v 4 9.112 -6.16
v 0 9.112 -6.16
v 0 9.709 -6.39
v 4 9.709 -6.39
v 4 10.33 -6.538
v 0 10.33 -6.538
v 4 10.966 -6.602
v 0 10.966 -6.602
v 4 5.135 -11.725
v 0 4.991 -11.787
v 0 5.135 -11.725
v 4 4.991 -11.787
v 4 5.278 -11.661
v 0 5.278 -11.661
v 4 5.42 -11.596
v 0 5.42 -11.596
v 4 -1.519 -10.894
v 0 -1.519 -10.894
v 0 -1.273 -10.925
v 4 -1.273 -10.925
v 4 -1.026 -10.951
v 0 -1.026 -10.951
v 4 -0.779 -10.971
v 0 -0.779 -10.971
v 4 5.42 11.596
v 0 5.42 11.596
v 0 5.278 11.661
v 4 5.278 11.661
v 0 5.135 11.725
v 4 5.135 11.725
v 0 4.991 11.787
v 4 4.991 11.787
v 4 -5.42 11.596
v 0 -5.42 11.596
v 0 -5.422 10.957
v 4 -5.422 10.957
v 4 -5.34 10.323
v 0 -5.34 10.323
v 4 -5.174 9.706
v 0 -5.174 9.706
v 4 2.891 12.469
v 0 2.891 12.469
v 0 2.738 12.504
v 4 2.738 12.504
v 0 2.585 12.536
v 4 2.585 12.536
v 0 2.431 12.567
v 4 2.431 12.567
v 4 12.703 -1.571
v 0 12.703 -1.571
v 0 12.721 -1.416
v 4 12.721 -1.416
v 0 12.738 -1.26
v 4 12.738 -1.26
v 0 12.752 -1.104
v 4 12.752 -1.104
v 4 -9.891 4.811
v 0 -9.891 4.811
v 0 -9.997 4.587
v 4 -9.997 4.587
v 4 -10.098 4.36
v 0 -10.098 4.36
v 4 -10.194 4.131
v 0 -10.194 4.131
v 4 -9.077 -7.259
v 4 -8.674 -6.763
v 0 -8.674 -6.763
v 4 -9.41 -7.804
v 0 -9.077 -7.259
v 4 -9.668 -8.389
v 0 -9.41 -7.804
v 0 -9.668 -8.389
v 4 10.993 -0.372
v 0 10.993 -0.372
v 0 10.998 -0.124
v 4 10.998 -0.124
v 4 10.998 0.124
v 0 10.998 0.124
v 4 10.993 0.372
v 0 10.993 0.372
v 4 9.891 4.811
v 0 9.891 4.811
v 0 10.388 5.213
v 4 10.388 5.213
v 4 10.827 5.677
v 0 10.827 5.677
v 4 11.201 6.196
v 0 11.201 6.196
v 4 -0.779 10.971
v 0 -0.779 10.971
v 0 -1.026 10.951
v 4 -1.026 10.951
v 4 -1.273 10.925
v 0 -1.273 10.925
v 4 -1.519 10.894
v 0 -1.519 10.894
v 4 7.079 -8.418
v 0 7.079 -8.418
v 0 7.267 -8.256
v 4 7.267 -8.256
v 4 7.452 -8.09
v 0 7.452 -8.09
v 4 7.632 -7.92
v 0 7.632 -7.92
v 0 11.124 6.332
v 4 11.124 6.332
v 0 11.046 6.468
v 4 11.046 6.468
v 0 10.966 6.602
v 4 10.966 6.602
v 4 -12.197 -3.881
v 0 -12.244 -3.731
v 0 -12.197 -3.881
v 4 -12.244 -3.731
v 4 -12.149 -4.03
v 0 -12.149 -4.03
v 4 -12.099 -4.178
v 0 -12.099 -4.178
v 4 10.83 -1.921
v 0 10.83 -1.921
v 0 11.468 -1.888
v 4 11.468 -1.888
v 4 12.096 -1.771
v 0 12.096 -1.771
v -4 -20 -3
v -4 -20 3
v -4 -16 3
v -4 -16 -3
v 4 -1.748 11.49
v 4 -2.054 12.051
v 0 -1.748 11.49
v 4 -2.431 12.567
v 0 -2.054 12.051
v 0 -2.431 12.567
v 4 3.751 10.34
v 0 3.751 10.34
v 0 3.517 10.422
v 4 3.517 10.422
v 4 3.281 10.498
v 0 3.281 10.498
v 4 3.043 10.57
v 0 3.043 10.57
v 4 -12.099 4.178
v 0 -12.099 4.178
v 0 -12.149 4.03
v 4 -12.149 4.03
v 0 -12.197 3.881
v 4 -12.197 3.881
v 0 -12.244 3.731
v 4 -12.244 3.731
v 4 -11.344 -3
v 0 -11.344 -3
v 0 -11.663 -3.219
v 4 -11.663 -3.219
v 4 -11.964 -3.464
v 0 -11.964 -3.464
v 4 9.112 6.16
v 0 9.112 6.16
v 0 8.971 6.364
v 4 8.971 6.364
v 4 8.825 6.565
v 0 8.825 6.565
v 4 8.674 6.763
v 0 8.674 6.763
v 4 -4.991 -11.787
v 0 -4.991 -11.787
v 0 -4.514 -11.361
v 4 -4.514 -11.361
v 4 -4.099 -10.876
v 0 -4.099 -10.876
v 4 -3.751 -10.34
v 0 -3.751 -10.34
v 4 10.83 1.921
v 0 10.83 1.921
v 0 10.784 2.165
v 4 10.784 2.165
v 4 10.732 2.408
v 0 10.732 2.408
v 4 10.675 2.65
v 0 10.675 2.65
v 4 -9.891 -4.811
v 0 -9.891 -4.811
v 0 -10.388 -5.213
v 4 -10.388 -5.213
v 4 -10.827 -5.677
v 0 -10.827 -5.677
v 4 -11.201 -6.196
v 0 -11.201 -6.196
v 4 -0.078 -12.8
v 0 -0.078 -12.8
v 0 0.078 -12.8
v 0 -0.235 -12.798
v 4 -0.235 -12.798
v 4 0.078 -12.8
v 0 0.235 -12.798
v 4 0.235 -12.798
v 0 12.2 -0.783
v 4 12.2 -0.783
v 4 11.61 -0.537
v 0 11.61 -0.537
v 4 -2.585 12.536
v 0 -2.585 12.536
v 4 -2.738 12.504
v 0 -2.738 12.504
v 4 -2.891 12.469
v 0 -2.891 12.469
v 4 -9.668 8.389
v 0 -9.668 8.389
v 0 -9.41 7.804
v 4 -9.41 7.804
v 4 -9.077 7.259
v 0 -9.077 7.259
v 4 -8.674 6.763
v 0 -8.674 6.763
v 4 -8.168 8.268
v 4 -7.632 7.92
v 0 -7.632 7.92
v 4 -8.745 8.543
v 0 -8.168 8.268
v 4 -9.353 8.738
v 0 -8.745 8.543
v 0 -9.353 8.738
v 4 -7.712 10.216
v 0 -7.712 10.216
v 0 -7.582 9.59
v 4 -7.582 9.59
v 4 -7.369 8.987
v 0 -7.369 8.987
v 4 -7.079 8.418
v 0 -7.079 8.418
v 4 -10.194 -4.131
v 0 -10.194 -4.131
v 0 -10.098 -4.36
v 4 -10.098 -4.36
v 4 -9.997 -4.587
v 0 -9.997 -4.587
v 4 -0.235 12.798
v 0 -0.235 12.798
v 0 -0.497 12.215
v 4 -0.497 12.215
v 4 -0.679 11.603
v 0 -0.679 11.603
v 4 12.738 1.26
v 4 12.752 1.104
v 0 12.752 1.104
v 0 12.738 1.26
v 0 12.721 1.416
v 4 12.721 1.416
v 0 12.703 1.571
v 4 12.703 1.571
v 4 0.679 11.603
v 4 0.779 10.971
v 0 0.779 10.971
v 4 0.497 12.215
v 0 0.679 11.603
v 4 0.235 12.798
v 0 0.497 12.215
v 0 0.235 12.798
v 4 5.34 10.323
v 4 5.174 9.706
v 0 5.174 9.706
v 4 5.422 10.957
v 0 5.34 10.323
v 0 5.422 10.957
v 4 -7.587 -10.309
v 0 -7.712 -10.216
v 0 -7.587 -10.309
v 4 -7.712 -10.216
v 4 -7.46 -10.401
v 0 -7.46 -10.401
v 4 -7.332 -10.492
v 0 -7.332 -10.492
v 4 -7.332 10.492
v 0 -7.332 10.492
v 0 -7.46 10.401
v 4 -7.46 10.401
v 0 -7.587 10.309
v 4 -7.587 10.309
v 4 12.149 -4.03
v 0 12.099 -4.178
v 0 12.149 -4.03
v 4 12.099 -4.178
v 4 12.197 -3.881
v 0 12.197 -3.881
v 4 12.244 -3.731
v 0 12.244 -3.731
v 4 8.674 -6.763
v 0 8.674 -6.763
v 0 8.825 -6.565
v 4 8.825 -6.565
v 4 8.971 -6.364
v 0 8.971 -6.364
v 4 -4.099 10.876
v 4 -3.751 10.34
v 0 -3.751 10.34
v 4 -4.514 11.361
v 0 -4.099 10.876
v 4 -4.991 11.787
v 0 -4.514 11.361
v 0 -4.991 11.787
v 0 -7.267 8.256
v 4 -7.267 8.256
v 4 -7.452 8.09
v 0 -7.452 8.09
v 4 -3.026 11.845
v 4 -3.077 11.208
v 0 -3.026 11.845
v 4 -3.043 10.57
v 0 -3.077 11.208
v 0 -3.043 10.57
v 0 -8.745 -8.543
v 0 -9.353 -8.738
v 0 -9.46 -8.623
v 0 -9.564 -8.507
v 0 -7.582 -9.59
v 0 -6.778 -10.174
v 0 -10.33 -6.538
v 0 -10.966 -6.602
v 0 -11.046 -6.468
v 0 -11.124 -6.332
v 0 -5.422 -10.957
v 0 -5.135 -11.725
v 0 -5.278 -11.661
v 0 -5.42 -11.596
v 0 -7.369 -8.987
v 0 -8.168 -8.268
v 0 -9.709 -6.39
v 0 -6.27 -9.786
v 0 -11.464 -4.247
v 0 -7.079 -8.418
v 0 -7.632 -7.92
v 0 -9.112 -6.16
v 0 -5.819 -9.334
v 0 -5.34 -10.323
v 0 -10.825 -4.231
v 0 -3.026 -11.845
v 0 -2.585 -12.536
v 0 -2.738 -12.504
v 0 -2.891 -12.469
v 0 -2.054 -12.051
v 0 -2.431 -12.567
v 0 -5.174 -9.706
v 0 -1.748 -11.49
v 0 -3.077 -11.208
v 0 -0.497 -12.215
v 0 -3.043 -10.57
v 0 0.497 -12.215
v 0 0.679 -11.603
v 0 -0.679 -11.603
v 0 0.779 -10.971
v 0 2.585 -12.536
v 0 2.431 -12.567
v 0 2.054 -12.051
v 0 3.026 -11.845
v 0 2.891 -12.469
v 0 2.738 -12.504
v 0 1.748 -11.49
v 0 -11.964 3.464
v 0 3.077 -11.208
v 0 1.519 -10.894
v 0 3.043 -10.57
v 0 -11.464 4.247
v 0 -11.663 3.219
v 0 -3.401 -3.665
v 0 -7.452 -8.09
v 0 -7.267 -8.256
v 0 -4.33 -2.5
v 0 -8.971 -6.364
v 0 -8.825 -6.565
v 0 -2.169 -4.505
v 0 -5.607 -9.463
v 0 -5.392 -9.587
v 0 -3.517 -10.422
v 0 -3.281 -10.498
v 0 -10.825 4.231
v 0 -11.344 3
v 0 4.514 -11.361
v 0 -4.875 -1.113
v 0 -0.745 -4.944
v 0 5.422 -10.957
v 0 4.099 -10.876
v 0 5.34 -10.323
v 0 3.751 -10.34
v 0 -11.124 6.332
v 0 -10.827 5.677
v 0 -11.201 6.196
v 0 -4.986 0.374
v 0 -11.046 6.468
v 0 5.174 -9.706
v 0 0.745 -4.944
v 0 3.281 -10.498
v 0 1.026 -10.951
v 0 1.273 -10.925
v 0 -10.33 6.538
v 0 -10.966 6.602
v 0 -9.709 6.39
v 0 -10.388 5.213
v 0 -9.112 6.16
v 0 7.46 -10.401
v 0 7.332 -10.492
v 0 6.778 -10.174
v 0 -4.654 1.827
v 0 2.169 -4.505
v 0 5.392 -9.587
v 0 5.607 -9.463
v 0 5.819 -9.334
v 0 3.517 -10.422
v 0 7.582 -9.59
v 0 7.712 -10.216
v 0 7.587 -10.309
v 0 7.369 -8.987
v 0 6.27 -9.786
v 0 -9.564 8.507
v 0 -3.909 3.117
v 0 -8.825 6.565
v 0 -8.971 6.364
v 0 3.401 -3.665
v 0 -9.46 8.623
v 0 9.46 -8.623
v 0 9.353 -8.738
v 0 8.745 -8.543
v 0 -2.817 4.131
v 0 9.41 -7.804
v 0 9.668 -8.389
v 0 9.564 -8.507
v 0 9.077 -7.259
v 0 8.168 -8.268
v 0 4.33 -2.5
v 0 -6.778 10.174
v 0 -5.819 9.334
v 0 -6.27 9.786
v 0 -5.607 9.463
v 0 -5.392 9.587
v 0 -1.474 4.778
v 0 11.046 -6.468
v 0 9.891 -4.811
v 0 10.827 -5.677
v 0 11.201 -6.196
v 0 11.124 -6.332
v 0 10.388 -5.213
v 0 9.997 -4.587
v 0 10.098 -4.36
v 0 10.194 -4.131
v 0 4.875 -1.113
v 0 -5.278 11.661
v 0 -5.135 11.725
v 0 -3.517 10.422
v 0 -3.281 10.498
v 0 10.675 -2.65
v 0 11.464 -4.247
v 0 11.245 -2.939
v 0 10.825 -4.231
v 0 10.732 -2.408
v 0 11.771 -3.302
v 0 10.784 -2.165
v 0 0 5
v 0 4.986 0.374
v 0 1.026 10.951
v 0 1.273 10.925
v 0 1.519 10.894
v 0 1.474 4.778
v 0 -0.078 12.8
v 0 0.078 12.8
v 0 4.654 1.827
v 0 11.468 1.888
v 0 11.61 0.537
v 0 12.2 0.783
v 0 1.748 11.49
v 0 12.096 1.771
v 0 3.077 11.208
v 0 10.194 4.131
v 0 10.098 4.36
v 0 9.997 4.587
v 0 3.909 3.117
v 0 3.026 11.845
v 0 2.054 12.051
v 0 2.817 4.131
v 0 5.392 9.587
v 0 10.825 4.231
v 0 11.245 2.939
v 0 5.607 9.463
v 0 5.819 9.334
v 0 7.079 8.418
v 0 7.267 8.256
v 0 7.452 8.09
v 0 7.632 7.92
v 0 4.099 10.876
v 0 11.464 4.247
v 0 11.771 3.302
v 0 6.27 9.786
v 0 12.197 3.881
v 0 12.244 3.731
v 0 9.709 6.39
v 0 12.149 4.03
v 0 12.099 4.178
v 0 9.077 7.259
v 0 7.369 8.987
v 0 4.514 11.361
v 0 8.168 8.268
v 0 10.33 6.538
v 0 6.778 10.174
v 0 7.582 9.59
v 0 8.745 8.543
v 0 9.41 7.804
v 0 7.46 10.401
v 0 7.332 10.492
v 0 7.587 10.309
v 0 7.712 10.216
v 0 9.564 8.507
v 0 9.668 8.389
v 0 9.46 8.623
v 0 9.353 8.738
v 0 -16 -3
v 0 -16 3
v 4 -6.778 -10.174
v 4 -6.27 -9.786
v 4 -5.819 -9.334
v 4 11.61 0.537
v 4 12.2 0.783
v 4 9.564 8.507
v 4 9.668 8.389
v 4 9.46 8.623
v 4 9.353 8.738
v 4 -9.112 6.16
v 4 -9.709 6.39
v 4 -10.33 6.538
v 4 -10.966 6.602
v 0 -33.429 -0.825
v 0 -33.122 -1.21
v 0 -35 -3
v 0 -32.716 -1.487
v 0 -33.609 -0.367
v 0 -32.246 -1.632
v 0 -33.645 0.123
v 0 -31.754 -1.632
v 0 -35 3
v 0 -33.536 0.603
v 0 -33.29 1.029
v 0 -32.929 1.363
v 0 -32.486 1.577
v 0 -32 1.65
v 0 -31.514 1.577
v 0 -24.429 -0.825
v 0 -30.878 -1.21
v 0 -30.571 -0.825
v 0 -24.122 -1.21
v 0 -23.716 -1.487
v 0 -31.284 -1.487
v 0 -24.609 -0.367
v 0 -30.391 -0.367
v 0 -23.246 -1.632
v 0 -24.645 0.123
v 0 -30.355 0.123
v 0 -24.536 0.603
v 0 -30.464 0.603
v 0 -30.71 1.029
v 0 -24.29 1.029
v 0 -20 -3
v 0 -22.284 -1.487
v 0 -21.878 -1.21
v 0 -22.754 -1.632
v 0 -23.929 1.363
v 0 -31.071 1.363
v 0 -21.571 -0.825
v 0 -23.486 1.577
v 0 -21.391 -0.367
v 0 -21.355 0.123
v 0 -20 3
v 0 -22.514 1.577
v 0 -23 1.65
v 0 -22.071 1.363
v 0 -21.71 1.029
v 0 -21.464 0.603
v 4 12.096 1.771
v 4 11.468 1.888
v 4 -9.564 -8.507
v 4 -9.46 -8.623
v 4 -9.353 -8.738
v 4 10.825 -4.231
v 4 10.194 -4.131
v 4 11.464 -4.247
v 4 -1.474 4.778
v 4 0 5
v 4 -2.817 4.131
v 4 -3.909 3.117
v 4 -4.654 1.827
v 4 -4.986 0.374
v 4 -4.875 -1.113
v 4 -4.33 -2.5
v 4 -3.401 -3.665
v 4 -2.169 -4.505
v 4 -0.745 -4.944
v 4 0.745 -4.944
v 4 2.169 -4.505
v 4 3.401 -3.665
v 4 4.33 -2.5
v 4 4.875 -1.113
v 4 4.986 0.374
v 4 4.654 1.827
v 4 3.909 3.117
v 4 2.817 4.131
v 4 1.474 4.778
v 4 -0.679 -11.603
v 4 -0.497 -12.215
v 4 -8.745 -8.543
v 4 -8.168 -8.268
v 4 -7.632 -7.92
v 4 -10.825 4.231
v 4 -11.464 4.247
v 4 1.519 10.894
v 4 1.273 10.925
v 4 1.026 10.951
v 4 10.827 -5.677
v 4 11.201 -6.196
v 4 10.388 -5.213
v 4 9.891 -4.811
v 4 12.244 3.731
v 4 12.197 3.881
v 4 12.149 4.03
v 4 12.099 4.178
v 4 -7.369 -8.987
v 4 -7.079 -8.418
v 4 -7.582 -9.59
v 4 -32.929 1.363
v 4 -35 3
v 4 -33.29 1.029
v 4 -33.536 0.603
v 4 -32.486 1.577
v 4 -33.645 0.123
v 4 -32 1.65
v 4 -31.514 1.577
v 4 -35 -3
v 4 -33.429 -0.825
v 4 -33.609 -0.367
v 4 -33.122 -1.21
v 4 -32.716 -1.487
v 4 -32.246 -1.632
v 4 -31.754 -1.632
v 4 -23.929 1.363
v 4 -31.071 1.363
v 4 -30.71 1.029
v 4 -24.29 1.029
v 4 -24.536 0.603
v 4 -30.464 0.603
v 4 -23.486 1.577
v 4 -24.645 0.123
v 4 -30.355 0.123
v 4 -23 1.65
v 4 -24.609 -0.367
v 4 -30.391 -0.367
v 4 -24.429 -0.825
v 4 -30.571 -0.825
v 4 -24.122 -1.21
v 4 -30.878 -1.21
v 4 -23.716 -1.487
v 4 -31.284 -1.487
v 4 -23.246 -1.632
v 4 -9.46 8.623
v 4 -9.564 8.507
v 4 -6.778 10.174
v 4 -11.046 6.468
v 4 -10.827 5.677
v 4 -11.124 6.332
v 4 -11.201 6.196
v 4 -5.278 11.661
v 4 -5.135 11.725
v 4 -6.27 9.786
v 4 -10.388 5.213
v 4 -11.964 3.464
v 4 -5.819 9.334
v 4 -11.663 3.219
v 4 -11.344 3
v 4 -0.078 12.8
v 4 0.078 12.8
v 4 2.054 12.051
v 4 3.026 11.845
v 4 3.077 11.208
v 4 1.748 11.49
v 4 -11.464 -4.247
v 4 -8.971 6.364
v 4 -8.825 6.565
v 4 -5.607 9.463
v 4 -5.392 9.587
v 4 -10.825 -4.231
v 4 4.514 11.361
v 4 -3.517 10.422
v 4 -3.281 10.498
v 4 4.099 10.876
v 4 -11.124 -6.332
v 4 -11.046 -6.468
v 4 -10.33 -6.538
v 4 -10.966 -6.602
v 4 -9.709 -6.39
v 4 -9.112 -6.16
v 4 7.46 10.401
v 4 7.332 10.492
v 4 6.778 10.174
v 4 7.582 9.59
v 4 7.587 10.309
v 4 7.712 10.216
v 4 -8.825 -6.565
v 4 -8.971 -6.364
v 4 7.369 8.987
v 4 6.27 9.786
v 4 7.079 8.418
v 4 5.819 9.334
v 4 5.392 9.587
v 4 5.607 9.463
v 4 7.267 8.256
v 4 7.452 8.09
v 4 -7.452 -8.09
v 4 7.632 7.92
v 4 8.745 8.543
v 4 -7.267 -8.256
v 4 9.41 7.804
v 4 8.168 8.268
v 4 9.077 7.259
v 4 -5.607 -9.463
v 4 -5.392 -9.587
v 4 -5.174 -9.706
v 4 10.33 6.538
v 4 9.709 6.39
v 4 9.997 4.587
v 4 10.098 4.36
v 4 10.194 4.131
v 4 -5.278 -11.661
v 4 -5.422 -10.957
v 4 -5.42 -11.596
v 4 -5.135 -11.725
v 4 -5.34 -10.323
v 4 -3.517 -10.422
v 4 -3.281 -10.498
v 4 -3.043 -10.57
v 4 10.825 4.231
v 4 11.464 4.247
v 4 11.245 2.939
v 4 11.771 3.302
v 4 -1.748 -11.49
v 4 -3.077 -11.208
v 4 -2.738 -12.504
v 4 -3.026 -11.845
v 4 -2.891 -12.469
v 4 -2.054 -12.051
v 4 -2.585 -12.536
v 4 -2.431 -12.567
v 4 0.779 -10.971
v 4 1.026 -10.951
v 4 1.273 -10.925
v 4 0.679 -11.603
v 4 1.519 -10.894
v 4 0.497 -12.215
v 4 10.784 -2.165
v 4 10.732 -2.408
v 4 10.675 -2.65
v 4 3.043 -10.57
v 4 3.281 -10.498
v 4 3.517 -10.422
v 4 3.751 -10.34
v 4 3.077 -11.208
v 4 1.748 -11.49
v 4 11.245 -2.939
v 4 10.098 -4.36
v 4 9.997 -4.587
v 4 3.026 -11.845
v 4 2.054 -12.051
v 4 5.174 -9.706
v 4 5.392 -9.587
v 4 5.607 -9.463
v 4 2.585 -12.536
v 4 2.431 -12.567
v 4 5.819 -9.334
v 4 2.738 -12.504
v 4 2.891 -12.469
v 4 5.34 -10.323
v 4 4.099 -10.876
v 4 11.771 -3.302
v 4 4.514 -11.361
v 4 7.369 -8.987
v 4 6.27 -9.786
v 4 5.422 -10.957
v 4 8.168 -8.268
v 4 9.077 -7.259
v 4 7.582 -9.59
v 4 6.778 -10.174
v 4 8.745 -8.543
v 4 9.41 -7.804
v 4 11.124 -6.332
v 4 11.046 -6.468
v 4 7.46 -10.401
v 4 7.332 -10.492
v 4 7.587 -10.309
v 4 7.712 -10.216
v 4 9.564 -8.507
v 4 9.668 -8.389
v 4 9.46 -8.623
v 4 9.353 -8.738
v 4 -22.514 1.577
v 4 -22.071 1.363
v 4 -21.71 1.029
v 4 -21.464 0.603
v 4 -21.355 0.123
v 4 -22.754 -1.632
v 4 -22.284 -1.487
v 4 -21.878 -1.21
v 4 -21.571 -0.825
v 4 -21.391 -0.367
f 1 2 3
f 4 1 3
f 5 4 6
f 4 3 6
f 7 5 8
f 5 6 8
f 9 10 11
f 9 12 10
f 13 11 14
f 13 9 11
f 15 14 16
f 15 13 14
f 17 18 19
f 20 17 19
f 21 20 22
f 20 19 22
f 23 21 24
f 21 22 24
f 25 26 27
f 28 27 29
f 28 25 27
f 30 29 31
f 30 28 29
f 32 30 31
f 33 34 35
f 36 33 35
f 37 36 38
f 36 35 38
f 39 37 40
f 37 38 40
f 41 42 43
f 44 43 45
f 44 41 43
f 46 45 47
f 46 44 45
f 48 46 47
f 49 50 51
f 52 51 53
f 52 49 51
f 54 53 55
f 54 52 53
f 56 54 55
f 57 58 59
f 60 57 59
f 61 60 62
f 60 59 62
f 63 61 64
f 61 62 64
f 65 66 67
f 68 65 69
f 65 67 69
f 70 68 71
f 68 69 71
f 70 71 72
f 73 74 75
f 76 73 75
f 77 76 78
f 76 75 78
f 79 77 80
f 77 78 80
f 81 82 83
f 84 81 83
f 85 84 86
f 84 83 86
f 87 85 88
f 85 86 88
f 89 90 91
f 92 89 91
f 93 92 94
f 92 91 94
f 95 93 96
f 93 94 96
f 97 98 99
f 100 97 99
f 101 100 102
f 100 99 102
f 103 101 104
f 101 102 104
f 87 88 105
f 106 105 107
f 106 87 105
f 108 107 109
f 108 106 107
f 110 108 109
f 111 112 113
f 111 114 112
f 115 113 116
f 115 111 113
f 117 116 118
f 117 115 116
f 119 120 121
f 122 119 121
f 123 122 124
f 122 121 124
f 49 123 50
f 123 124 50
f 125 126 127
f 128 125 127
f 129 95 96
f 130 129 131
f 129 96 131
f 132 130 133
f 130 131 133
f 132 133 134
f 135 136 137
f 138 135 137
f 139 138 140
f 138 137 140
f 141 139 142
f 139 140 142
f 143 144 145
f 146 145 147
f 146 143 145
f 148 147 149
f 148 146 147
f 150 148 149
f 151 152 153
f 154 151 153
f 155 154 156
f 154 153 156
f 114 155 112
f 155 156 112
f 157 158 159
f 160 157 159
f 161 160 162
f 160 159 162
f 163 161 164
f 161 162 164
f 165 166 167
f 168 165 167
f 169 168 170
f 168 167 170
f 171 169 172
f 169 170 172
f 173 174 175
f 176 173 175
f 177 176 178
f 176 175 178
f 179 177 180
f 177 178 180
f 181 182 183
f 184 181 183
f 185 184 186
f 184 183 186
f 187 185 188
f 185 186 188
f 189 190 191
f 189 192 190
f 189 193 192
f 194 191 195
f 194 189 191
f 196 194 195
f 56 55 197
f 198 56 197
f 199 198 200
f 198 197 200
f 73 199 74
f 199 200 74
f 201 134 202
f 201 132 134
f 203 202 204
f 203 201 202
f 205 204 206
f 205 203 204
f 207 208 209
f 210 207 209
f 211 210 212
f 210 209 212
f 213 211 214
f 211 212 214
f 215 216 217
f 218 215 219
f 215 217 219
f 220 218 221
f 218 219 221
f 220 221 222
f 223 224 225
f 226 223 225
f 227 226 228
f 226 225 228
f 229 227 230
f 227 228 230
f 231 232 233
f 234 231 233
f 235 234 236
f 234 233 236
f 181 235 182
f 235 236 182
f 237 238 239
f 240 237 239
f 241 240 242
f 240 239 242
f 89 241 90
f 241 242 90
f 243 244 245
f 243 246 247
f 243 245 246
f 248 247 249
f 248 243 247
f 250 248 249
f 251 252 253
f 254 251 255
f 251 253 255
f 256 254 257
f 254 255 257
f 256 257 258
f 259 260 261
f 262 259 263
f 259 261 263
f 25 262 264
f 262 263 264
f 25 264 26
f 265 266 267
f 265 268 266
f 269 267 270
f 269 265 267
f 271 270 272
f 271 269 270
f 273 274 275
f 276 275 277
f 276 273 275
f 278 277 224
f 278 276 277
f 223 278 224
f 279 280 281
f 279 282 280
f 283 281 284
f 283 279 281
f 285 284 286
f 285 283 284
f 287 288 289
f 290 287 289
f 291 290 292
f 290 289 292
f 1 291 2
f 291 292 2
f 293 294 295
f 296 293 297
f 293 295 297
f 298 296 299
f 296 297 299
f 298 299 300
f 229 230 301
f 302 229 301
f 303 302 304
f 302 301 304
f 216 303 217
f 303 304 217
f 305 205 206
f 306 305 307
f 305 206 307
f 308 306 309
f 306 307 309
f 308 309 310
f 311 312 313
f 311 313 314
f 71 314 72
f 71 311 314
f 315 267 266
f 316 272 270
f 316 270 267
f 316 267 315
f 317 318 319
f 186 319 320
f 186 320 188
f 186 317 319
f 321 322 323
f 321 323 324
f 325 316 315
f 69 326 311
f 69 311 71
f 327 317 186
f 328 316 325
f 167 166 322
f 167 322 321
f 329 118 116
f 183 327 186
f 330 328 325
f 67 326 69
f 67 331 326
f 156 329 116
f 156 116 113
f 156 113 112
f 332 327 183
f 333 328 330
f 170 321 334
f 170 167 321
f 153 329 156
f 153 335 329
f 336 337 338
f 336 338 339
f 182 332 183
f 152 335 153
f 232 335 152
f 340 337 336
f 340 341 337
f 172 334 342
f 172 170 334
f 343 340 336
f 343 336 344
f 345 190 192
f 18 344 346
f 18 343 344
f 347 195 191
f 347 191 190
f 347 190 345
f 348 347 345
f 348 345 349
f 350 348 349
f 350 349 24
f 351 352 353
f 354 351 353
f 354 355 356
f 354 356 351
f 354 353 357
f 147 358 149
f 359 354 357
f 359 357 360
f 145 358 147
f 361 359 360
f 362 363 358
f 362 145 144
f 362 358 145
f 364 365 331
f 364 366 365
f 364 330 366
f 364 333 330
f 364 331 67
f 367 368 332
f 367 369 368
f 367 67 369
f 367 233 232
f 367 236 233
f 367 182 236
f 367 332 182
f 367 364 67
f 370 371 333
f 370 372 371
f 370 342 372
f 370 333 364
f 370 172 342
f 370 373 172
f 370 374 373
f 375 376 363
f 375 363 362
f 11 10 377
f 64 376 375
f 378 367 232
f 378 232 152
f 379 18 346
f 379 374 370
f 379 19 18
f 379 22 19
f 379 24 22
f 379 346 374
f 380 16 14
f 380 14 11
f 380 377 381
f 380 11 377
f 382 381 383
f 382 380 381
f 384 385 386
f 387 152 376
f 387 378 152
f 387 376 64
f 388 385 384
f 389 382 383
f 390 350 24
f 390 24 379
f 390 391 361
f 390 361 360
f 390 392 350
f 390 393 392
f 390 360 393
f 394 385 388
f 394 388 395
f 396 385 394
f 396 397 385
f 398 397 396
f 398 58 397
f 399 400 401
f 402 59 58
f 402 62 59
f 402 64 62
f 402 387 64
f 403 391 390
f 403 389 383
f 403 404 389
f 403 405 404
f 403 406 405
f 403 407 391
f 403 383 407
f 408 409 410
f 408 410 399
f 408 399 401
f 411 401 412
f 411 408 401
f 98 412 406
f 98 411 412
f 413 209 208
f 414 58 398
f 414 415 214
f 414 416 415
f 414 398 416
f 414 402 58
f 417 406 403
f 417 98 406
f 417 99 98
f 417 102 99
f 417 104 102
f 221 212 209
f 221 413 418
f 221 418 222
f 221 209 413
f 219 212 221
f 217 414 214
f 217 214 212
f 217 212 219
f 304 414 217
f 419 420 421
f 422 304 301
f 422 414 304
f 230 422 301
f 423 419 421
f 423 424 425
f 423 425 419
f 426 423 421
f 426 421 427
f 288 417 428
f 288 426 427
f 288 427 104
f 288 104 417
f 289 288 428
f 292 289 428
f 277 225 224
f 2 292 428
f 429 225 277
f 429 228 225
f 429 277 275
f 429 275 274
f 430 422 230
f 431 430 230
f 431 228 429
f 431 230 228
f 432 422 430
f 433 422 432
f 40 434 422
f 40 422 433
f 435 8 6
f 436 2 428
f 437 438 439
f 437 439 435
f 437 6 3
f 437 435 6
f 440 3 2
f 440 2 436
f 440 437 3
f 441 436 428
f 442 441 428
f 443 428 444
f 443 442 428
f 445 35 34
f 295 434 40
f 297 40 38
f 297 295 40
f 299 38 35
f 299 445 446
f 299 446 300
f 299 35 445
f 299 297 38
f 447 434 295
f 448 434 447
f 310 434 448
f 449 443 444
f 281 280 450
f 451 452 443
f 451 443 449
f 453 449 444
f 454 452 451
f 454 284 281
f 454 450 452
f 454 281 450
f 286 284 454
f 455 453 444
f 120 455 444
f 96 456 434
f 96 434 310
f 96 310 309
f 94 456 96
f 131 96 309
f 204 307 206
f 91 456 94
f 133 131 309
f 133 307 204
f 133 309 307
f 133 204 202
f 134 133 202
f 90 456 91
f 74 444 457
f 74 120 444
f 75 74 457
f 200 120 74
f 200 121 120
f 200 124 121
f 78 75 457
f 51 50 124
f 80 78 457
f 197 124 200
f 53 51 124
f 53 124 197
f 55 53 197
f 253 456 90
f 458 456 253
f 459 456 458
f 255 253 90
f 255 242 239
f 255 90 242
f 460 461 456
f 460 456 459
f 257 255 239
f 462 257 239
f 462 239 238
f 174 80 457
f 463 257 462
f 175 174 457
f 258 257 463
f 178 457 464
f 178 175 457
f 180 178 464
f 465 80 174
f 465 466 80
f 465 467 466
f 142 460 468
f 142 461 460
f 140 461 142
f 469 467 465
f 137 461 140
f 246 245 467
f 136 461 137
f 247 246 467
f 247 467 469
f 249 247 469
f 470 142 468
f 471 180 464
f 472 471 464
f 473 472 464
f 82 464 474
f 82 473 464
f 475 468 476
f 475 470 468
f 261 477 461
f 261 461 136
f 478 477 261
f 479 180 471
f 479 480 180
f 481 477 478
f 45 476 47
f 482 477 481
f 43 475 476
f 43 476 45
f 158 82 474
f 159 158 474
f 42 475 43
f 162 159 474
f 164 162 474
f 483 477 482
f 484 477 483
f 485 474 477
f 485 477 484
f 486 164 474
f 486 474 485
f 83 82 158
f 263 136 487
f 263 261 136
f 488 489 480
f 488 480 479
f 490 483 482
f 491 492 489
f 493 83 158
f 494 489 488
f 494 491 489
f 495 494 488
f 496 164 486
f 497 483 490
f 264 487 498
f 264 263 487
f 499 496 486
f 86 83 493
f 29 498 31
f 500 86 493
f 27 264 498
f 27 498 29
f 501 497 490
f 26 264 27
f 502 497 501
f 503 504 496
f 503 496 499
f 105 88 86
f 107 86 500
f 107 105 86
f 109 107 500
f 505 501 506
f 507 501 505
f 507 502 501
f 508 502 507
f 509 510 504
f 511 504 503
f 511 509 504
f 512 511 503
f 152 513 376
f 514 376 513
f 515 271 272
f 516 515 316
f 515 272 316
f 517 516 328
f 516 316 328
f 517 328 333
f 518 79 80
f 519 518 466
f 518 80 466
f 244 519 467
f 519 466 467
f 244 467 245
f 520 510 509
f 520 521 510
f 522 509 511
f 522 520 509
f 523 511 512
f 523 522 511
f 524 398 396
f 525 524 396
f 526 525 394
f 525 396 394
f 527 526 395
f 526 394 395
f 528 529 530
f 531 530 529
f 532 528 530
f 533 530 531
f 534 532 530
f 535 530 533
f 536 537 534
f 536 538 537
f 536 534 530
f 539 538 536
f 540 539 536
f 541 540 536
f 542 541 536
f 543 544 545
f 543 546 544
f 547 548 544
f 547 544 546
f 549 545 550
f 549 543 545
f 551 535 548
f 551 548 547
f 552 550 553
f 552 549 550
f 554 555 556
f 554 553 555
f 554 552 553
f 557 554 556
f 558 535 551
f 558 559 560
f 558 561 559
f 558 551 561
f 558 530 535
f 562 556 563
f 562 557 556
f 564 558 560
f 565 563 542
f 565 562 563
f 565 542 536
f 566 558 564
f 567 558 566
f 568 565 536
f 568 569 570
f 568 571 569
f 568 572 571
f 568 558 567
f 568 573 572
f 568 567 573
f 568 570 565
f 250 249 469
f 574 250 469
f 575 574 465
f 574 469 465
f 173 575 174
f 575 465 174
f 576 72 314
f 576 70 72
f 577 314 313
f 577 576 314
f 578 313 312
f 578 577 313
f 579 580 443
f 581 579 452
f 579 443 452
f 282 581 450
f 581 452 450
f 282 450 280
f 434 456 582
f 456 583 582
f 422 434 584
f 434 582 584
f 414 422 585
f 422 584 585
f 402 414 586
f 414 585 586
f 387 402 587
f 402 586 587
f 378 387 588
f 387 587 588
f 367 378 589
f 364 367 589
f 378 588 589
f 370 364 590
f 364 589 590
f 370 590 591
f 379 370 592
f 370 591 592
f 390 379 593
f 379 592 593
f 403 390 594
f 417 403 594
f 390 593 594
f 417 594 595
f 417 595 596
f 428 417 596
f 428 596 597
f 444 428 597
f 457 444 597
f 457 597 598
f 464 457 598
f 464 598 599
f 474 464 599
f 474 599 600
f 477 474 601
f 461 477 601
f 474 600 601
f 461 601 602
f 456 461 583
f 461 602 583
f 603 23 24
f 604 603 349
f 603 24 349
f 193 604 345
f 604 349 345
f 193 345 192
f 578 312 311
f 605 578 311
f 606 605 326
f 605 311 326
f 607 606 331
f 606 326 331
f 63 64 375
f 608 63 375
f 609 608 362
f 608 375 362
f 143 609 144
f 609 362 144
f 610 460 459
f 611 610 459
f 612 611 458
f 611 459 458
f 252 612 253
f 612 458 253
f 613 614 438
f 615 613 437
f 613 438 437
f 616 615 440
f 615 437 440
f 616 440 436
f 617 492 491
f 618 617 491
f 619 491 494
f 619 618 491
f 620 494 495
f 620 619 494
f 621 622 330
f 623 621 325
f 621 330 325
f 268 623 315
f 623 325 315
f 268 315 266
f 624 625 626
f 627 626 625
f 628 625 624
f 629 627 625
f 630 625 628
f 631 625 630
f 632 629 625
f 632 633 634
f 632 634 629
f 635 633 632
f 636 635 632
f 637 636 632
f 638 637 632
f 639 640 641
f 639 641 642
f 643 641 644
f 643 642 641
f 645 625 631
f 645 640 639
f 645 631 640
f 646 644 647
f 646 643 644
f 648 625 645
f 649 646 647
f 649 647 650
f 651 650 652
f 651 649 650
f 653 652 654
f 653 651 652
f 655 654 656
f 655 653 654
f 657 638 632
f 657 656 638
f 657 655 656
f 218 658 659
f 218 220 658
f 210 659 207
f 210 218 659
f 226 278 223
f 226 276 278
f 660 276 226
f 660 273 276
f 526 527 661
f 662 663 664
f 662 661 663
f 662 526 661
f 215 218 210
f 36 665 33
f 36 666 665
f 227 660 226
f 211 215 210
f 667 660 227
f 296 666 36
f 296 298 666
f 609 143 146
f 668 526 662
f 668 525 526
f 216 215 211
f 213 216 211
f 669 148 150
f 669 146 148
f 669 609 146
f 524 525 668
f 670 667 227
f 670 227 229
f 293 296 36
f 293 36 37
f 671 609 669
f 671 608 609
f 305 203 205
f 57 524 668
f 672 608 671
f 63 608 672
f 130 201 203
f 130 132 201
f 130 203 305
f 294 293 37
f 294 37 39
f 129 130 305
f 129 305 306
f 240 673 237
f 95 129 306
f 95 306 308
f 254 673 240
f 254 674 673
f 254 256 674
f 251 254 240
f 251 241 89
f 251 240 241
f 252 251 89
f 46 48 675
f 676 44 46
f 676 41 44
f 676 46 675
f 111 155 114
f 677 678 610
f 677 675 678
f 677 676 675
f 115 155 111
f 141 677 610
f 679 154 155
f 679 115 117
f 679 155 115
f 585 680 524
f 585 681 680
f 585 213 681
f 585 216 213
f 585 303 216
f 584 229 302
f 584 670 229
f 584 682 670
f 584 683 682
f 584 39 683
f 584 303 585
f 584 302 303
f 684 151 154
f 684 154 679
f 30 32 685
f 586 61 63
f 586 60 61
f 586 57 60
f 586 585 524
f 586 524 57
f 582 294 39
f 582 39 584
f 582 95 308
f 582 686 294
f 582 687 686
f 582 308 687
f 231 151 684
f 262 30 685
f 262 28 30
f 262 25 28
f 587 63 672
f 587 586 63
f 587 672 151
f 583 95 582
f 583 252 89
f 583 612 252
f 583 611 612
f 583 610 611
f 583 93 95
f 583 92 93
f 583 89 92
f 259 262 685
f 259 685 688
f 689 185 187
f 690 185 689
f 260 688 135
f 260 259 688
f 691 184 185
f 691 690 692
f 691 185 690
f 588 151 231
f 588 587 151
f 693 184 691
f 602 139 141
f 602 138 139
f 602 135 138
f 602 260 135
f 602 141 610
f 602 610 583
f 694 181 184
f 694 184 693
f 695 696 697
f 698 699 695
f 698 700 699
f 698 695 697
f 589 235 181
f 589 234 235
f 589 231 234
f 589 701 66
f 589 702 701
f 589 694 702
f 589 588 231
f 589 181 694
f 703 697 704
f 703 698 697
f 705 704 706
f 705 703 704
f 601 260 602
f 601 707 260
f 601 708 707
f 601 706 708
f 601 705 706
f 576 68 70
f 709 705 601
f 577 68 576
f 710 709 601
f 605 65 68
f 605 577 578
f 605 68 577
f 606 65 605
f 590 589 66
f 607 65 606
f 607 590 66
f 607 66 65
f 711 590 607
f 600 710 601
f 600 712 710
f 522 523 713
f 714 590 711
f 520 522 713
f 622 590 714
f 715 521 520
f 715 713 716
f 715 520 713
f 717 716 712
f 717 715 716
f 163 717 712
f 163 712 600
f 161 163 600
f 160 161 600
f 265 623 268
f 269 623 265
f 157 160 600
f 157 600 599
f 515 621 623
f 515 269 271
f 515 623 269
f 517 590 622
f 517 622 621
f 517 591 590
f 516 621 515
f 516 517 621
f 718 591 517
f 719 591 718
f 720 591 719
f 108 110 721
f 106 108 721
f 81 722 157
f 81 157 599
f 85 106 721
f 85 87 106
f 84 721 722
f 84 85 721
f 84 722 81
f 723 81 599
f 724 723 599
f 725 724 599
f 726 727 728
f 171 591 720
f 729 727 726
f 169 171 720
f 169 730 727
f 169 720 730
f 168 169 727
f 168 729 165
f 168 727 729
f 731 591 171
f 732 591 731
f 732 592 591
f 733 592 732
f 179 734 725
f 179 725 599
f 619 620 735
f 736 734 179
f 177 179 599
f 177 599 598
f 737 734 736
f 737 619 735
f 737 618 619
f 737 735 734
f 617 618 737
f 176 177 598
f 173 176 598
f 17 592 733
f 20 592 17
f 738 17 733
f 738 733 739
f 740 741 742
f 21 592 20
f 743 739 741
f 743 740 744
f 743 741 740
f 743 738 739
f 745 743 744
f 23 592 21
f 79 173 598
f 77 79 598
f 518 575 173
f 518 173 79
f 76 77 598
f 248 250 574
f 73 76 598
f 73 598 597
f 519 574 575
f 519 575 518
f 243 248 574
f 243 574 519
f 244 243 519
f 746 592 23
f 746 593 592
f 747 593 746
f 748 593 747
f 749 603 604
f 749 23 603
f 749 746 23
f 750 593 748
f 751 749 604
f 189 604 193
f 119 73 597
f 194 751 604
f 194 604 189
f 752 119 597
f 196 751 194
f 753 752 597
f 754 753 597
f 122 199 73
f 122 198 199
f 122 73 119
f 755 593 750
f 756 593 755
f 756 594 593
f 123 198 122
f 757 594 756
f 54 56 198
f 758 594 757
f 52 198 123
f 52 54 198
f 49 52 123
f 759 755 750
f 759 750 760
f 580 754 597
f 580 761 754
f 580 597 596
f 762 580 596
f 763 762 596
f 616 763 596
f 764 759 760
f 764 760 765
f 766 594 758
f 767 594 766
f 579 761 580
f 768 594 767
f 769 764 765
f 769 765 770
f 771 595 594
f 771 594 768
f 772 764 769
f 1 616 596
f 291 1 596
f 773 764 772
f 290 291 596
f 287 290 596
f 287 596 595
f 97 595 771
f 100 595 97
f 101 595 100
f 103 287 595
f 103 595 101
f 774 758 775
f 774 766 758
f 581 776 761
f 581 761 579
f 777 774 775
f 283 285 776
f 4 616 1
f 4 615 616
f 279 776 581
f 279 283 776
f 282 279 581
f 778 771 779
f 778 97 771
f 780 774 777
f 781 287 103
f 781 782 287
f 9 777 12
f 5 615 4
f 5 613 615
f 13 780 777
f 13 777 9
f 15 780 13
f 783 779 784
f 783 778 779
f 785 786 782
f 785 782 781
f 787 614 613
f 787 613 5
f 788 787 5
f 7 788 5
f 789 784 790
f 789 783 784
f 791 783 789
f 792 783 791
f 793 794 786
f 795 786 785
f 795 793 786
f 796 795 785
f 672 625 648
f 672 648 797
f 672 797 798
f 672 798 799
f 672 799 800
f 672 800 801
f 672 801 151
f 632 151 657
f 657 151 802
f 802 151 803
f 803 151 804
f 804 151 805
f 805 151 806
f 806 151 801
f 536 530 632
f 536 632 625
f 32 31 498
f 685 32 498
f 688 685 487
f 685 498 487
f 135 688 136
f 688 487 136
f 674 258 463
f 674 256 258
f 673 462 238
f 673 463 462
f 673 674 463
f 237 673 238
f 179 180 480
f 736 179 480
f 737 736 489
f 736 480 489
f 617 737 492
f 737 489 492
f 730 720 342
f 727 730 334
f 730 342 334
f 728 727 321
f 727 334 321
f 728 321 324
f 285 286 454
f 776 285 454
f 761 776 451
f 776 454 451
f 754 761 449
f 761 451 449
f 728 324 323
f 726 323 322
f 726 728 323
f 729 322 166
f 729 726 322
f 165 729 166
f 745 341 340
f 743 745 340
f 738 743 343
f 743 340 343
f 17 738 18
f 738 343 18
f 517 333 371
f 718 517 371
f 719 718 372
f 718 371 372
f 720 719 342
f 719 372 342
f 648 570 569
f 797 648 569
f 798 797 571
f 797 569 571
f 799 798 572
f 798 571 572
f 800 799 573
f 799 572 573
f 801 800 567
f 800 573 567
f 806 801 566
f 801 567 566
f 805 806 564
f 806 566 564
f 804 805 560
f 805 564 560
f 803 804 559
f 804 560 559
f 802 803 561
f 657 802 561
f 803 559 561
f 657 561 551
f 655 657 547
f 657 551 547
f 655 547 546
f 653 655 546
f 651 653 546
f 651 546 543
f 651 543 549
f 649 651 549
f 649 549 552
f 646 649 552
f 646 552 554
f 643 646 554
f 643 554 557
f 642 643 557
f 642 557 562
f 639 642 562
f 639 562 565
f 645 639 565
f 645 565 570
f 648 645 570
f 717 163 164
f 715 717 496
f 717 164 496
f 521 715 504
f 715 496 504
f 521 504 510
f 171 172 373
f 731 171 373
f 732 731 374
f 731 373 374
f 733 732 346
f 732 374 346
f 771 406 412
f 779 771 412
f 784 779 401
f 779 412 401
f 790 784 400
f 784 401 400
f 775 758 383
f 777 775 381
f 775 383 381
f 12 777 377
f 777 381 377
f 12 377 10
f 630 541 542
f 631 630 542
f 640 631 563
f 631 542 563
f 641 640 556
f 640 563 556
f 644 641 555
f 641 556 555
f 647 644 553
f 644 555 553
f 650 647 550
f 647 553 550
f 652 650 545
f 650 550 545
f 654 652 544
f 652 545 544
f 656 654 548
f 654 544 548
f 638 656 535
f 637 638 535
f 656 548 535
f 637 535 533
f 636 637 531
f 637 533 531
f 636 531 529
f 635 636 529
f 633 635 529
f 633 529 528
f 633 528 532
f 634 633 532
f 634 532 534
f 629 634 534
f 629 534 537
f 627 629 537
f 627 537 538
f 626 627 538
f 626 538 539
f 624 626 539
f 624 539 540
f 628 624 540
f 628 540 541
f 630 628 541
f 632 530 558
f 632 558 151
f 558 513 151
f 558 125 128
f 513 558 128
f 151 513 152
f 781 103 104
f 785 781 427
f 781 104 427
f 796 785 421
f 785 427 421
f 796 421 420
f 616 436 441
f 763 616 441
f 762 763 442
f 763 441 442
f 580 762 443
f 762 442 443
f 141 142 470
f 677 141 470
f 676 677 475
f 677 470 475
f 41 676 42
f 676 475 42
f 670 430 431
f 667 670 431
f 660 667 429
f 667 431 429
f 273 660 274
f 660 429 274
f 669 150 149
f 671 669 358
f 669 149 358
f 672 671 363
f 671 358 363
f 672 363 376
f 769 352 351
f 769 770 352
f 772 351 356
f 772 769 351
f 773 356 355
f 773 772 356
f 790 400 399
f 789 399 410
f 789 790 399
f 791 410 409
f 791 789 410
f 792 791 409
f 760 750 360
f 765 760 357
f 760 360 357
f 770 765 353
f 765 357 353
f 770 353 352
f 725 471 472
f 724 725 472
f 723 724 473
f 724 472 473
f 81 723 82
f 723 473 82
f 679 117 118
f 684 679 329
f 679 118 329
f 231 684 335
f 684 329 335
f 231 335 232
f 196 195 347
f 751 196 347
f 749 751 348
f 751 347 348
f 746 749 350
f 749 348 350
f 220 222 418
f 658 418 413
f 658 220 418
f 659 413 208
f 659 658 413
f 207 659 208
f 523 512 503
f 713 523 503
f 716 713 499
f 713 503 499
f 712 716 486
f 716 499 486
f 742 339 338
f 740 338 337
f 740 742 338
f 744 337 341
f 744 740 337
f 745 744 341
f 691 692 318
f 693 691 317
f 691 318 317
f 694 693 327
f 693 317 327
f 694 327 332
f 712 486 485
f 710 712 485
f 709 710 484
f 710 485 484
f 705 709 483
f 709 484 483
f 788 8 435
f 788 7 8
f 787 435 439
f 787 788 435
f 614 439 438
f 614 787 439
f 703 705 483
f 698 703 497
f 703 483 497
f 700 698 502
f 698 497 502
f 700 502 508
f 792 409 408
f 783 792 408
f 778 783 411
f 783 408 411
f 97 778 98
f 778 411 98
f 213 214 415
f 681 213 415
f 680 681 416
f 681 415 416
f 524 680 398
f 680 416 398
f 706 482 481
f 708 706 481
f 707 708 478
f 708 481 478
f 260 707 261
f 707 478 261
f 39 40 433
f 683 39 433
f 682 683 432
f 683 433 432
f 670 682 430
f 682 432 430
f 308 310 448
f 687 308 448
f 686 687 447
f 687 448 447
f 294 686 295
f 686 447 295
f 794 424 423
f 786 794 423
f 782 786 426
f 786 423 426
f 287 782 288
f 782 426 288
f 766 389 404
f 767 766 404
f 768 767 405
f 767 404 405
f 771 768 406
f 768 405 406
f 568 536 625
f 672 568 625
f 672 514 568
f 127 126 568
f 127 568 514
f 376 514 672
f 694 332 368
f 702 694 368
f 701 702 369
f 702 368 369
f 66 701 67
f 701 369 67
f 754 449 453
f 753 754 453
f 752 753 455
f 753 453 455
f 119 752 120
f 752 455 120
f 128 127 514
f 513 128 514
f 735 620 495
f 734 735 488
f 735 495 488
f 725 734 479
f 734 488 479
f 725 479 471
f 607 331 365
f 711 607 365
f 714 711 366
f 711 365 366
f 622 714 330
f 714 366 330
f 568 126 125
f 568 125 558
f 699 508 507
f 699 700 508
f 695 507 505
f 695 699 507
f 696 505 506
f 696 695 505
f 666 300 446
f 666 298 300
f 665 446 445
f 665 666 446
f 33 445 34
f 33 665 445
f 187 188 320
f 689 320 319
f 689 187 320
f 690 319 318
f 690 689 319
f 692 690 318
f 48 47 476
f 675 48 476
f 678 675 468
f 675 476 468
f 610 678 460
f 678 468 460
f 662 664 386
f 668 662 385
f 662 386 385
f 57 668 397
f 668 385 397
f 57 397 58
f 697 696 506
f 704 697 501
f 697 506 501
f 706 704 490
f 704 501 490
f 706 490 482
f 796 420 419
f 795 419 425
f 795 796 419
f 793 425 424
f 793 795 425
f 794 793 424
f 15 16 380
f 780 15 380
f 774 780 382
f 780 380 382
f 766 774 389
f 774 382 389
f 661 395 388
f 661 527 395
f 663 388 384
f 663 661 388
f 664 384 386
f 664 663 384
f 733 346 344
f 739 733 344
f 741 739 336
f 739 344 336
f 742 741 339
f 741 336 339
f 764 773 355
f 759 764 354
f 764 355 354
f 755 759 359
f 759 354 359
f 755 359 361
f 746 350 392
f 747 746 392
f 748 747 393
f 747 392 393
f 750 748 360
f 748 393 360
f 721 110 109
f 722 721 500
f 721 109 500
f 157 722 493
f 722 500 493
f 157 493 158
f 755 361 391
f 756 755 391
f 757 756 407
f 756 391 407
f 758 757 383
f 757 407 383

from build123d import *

# Parameters (mm, degrees)
BASPROSKE_W         = 4
BASPROSKE_H         = 12.8
TOOTHCUT_DEPTH      = 19.538608362
TEETHCUTS_COUNT     = 30
TEETHCUTS_ANGLE     = 348
BORSKE_R            = 5
BORE_DEPTH          = 50.0000508
SKETCH_1_W          = 6
SKETCH_1_H          = 28.363297546
EXTRUDE_1_DEPTH     = 4
SKETCH_4_W          = 2
SKETCH_4_H          = 15
CUT_EXTRUDE_2_DEPTH = 6
SKETCH_6_R          = 1.65
CUT_EXTRUDE_3_DEPTH = 4
EXTRUDE_START       = 2
SKETCH_8_W          = 6
SKETCH_8_H          = 15
SKETCH_8_R          = 1.65
EXTRUDE_2_DEPTH     = 2
SKETCH_9_W          = 4
SKETCH_9_H          = 4
EXTRUDE_3_DEPTH     = 6


with BuildPart() as part:
    # BasProSke → Base-Revolve (revolve)
    with BuildSketch(Plane(origin=(0, 0, 0), x_dir=(1, 0, 0), z_dir=(0, 1, 0)), mode=Mode.PRIVATE) as base_revolve_sk:
        with Locations((2, 6.4)):
            Rectangle(BASPROSKE_W, BASPROSKE_H)
    revolve(base_revolve_sk.sketch.rotate(Axis((-10, 0, 0), (1, 0, 0)), 180), axis=Axis((-10, 0, 0), (1, 0, 0)))

    # TooCutSke → ToothCut (cut, through all)
    with BuildSketch(Plane(origin=(0, 0, 0), x_dir=(0, 0, -1), z_dir=(1, 0, 0))):
        with BuildLine():
            ThreePointArc((0.37243947, 10.992692566), (0, 10.999), (-0.37243947, 10.992692566))
            ThreePointArc((-0.37243947, 10.992692566), (-0.655704499, 11.922595954), (-1.120515575, 12.776358245))
            ThreePointArc((-1.120515575, 12.776358245), (0, 12.8254), (1.120515575, 12.776358245))
            ThreePointArc((1.120515575, 12.776358245), (0.655704499, 11.922595954), (0.37243947, 10.992692566))
        make_face()
    toothcut = extrude(amount=TOOTHCUT_DEPTH, mode=Mode.SUBTRACT)

    # TeethCuts: ToothCut ×30 about axis
    teethcuts_axis = Axis((-10, 0, 0), (1, 0, 0))
    for i in range(1, TEETHCUTS_COUNT):
        add(toothcut.rotate(teethcuts_axis, i * TEETHCUTS_ANGLE / (TEETHCUTS_COUNT - 1)), mode=Mode.SUBTRACT)

    # BorSke → Bore (cut, symmetric)
    with BuildSketch(Plane(origin=(0, 0, 0), x_dir=(0, 0, -1), z_dir=(1, 0, 0))):
        with Locations(Location((0, 0, 0), (0, 0, 180))):
            Circle(BORSKE_R)
    extrude(amount=BORE_DEPTH, both=True, mode=Mode.SUBTRACT)

    # 草图1 → 凸台-拉伸1 (add)
    with BuildSketch(Plane(origin=(4, 0, 0), x_dir=(0, 0, -1), z_dir=(1, 0, 0))):
        with Locations((0, -20.818351227)):
            Rectangle(SKETCH_1_W, SKETCH_1_H)
    extrude(amount=-EXTRUDE_1_DEPTH)

    # 草图4 → 切除-拉伸2 (cut)
    with BuildSketch(Plane(origin=(0, 0, -3), x_dir=(-1, 0, 0), z_dir=(0, 0, -1))):
        with Locations((-1, -27.5)):
            Rectangle(SKETCH_4_W, SKETCH_4_H)
    extrude(amount=-CUT_EXTRUDE_2_DEPTH, mode=Mode.SUBTRACT)

    # 草图6 → 切除-拉伸3 (cut)
    with BuildSketch(Plane.ZY.offset(-2)):
        with Locations((0, -23)):
            Circle(SKETCH_6_R)
        with Locations((0, -32)):
            Circle(SKETCH_6_R)
    extrude(amount=-CUT_EXTRUDE_3_DEPTH, mode=Mode.SUBTRACT)

    # 草图8 → 凸台-拉伸2 (add)
    with BuildSketch(Plane.ZY.offset(-2).offset(EXTRUDE_START)):
        with Locations((0, -27.5)):
            Rectangle(SKETCH_8_W, SKETCH_8_H)
        with Locations((0, -23)):
            Circle(SKETCH_8_R, mode=Mode.SUBTRACT)
        with Locations((0, -32)):
            Circle(SKETCH_8_R, mode=Mode.SUBTRACT)
    extrude(amount=-EXTRUDE_2_DEPTH)

    # 草图9 → 凸台-拉伸3 (add)
    with BuildSketch(Plane.XY.offset(3)):
        with Locations((-2, -18)):
            Rectangle(SKETCH_9_W, SKETCH_9_H)
    extrude(amount=-EXTRUDE_3_DEPTH)


solid = part.part
